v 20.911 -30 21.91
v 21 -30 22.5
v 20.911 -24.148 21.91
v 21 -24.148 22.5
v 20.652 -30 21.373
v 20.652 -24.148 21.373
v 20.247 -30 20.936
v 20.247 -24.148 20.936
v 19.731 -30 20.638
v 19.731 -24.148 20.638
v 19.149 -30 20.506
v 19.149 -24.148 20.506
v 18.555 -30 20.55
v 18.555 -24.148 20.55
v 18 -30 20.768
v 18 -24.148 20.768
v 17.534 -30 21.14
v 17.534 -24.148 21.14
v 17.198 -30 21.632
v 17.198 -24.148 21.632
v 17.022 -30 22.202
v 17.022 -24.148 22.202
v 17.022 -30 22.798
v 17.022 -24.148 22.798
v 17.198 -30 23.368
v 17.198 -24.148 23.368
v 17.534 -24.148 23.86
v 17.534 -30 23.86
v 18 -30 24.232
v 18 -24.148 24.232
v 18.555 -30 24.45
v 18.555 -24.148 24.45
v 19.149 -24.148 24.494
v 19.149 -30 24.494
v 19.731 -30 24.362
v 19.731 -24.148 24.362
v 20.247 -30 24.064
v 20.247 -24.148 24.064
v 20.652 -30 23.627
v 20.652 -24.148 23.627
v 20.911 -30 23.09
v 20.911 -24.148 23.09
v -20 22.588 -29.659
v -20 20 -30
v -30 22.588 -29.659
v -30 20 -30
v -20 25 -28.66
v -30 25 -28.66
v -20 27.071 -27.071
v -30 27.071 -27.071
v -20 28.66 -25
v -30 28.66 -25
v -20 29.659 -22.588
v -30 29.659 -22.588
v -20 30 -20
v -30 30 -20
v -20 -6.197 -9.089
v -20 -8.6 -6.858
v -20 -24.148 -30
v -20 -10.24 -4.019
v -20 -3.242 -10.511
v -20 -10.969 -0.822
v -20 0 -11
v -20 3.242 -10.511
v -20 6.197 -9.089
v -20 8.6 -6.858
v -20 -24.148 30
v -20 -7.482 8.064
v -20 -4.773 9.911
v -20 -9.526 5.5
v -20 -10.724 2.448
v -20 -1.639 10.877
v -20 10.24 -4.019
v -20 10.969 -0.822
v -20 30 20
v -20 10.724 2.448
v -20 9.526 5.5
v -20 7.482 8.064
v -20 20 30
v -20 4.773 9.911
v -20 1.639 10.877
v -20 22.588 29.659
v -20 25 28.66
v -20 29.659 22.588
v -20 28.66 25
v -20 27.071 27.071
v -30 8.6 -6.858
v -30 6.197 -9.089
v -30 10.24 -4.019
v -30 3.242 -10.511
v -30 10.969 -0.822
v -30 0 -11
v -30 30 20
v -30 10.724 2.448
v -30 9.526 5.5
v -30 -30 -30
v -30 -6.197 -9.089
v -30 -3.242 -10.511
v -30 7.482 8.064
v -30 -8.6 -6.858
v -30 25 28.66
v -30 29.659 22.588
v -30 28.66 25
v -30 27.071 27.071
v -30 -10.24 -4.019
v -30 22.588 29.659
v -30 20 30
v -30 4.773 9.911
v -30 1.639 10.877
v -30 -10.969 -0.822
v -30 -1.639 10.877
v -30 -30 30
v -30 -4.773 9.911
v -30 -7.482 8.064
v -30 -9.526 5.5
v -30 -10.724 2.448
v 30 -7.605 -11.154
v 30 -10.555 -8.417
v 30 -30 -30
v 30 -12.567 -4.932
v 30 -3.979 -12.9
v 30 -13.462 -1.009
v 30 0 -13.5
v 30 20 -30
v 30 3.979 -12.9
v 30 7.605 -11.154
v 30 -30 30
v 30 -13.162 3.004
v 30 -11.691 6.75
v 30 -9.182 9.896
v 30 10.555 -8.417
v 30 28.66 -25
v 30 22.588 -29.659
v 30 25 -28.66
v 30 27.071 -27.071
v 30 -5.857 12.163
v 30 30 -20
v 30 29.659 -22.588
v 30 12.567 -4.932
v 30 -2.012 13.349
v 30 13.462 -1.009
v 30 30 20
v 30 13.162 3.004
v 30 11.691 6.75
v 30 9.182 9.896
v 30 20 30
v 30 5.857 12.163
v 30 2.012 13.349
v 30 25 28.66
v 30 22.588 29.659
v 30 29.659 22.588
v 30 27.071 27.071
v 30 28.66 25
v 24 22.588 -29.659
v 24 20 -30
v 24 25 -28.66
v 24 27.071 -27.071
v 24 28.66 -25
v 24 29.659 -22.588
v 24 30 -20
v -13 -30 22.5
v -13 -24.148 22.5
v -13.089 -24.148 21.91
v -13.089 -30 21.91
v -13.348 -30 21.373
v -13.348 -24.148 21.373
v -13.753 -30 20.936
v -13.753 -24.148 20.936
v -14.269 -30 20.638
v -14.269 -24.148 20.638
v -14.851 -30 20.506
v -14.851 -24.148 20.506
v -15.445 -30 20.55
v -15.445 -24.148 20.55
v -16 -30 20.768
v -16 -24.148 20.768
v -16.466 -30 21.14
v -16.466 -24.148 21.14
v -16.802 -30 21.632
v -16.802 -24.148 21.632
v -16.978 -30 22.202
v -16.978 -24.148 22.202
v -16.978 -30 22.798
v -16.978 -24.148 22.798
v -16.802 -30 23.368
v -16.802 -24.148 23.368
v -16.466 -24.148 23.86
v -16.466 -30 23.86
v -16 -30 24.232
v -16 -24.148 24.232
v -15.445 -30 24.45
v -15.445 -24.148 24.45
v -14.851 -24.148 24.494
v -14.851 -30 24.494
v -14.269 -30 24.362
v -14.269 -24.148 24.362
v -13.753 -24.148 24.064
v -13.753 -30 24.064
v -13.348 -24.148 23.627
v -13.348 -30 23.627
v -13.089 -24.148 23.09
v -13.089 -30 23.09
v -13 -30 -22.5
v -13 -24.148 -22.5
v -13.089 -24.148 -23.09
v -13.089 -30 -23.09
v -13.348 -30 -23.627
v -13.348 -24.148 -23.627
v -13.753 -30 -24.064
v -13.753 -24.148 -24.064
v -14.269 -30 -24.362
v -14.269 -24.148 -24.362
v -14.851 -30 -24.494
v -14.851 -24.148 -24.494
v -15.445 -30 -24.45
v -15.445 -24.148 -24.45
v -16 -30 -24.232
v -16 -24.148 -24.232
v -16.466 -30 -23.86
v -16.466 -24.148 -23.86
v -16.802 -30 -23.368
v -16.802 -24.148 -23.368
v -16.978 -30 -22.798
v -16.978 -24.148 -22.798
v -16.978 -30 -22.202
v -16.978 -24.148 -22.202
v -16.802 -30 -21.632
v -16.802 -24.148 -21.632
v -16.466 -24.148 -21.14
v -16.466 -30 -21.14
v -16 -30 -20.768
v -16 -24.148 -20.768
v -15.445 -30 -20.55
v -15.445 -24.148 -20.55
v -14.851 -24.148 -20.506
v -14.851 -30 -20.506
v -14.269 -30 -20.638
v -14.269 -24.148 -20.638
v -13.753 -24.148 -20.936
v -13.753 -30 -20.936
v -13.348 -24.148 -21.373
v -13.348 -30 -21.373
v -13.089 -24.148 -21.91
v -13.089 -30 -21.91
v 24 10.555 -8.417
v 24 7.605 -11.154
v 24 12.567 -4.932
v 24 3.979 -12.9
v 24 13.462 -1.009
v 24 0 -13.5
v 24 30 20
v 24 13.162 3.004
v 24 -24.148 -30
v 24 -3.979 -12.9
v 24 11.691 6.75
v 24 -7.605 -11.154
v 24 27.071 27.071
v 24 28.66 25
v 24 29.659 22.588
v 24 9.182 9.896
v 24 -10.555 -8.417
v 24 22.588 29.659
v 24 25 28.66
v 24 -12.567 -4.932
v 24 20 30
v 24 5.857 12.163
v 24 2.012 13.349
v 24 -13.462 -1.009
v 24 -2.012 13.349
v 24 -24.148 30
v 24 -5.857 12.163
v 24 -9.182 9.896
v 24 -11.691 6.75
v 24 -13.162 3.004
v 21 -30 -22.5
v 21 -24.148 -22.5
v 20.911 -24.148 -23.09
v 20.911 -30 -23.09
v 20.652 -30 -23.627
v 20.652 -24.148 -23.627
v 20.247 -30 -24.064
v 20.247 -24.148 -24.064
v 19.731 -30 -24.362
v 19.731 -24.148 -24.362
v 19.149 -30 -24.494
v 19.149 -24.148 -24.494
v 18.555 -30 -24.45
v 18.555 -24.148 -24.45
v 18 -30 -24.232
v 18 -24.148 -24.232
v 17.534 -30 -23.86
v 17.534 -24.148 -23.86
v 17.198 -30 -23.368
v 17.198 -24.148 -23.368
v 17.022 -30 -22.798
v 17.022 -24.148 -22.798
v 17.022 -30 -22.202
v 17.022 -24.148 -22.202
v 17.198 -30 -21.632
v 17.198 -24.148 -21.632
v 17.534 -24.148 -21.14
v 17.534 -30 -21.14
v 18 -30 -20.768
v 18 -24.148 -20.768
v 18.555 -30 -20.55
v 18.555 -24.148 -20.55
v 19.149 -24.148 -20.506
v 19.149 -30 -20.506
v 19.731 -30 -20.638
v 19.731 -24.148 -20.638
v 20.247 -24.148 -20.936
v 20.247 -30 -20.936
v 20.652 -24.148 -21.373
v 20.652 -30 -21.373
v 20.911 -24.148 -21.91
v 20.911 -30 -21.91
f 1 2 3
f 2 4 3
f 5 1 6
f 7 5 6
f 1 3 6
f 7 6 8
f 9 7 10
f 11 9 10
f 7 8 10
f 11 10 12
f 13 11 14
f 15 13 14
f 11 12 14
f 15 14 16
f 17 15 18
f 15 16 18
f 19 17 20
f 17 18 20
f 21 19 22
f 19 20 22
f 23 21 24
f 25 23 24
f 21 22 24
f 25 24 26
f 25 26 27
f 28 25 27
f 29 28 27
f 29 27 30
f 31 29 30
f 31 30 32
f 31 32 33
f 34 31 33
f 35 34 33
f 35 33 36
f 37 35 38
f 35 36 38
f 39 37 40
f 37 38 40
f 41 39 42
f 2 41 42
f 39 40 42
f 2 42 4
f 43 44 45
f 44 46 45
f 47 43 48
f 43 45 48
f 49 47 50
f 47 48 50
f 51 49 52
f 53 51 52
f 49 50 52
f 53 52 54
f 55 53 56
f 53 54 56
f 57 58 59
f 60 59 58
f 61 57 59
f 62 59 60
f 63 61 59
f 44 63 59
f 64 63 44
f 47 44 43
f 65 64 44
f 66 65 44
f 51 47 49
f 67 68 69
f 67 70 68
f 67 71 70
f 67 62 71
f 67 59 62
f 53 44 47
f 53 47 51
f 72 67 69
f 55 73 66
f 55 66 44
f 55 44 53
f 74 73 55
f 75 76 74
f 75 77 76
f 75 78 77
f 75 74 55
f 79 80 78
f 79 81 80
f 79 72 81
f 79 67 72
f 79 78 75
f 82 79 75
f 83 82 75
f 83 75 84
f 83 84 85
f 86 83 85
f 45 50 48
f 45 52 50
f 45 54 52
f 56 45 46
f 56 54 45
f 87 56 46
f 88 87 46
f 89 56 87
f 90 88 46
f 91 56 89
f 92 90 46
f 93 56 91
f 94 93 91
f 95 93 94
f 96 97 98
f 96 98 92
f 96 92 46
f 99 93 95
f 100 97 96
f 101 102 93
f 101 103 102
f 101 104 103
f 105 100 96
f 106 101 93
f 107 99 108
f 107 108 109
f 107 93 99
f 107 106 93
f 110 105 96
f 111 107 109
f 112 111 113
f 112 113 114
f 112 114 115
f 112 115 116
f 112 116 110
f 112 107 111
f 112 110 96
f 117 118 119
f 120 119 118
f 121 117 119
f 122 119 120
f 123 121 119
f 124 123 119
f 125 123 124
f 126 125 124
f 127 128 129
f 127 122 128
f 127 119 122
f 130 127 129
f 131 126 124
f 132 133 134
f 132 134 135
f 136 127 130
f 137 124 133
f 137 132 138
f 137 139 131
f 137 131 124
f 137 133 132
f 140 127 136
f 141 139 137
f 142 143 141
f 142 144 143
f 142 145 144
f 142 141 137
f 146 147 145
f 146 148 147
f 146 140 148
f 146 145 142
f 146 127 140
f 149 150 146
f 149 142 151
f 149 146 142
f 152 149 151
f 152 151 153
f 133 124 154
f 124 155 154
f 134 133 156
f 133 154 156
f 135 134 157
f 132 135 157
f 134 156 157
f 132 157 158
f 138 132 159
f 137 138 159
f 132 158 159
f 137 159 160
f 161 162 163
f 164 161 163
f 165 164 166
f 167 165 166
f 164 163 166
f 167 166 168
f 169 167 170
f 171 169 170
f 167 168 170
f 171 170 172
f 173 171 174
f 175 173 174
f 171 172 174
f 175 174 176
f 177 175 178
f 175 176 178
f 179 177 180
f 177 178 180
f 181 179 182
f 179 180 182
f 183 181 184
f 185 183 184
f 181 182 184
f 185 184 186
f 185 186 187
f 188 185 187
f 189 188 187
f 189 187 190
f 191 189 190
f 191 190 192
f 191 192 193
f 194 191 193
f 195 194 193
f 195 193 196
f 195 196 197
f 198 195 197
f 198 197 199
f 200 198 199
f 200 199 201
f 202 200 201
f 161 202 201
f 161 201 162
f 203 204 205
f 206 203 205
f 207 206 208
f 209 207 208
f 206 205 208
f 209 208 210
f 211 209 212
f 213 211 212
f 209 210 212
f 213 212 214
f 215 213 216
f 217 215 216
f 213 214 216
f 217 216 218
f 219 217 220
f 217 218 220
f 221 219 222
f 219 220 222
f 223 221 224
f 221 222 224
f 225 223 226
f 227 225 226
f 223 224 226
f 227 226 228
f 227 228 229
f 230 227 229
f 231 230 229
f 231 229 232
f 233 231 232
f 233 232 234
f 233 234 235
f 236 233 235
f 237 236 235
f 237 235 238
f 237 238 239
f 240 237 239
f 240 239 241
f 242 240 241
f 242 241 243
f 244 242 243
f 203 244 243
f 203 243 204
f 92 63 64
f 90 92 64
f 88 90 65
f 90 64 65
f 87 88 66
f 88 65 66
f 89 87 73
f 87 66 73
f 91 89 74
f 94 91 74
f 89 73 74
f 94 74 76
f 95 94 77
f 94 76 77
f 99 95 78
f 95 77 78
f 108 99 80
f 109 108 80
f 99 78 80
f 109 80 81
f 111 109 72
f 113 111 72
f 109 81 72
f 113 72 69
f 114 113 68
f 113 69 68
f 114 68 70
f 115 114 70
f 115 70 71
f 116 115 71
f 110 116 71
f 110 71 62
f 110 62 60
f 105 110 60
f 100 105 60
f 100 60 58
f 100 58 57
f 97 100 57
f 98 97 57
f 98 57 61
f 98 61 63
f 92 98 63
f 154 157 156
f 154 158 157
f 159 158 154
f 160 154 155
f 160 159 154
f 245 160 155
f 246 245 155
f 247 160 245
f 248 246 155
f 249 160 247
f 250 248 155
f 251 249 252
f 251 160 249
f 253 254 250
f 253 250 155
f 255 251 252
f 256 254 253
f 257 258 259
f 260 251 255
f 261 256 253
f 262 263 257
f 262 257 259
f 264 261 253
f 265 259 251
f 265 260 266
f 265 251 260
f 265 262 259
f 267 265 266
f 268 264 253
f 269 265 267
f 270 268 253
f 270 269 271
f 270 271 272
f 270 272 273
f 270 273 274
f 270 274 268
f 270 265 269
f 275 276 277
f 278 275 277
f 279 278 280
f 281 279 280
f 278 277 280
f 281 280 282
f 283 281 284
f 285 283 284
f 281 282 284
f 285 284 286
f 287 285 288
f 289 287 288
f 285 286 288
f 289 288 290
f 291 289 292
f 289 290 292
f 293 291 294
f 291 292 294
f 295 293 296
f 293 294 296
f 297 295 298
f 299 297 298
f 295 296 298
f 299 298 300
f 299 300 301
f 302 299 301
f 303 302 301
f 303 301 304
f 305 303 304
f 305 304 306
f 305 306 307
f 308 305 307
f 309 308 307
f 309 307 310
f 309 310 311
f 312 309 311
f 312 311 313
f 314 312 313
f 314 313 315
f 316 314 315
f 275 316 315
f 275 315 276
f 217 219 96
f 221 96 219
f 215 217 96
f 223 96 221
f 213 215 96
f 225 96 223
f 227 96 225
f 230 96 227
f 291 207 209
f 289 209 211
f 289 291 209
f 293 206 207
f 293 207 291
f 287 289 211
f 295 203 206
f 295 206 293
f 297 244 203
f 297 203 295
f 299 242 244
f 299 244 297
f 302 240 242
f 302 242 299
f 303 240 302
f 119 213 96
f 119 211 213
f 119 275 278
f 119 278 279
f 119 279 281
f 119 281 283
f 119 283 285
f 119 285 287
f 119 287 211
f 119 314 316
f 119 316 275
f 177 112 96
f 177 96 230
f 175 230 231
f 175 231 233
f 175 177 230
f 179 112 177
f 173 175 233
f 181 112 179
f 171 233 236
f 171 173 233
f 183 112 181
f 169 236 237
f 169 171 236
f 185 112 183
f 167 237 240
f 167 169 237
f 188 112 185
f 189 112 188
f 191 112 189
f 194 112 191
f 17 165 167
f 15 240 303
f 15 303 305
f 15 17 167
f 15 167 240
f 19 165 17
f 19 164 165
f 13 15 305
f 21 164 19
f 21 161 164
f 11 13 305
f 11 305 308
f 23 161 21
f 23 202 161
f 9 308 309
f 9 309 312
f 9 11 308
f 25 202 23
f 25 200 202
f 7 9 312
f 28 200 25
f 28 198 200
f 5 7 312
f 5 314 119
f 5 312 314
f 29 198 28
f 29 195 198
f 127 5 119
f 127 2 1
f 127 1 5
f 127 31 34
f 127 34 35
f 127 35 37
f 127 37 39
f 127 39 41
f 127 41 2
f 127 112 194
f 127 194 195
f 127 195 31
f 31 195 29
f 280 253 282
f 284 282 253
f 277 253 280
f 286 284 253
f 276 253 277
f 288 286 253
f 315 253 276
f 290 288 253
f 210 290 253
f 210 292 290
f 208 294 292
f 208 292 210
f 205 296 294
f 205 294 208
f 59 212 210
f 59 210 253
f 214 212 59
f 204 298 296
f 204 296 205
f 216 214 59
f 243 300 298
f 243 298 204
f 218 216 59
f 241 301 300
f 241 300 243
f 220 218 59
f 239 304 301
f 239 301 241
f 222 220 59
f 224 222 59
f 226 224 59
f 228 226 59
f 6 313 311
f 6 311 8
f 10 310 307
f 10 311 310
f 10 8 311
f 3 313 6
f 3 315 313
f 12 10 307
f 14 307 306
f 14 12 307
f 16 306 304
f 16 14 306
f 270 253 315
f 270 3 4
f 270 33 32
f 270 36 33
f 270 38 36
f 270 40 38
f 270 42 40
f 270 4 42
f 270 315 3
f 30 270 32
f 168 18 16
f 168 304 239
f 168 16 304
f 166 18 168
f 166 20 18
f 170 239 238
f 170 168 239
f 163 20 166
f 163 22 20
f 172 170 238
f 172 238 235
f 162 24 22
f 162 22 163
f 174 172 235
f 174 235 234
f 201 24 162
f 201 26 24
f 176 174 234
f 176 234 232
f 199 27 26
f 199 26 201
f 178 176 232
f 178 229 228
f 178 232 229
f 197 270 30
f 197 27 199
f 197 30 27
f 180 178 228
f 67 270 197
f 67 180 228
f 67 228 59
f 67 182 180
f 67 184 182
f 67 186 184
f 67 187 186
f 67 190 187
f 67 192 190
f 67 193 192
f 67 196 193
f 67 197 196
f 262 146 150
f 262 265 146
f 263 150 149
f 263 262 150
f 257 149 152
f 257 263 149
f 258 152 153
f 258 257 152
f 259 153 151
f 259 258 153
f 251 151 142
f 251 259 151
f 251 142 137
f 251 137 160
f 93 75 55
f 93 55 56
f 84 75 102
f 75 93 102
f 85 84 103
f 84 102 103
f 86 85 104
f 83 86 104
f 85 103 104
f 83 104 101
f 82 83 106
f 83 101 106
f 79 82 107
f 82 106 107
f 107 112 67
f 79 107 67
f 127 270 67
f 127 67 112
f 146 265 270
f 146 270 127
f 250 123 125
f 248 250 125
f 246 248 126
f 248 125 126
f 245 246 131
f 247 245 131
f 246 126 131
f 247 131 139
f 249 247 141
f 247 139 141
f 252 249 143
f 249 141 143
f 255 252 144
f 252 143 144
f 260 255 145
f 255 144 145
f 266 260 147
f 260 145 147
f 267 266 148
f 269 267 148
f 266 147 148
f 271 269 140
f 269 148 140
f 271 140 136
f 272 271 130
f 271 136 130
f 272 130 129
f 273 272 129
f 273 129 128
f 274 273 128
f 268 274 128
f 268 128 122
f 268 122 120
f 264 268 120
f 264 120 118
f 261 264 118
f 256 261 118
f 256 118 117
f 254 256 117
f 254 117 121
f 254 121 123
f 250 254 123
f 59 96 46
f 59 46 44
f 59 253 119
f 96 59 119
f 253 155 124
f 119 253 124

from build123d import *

# Parameters (mm, degrees)
BOSS_EXTRUDE1_DEPTH = 30
SKETCH2_R           = 11
CUT_EXTRUDE1_DEPTH  = 60
FILLET1_R           = 10
SKETCH3_R           = 2
CUT_EXTRUDE2_DEPTH  = 10
SKETCH13_R          = 13.5
CUT_EXTRUDE3_DEPTH  = 10


with BuildPart() as part:
    # Sketch1 → Boss-Extrude1 (new body, symmetric)
    with BuildSketch(Plane.XY):
        Polygon((-30, 30), (-30, -30), (30, -30), (30, 30), (24, 30), (24, -24.147945483), (-20, -24.147945483), (-20, 30), align=None)
    extrude(amount=BOSS_EXTRUDE1_DEPTH, both=True)

    # Sketch2 → Cut-Extrude1 (cut)
    with BuildSketch(Plane(origin=(0, 0, 0), x_dir=(0, 0, -1), z_dir=(1, 0, 0))):
        Circle(SKETCH2_R)
    extrude(amount=-CUT_EXTRUDE1_DEPTH, mode=Mode.SUBTRACT)

    # Fillet1
    fillet1_edges = [part.edges().sort_by_distance(p)[0] for p in [
        (-25, 30, -30),
        (27, 30, 30),
        (-25, 30, 30),
        (27, 30, -30),
    ]]
    fillet(fillet1_edges, radius=FILLET1_R)

    # Sketch3 → Cut-Extrude2 (cut, symmetric)
    with BuildSketch(Plane(origin=(0, -24.147945483, 0), x_dir=(1, 0, 0), z_dir=(0, 1, 0))):
        with Locations((-15, 22.5)):
            Circle(SKETCH3_R)
        with Locations((19, 22.5)):
            Circle(SKETCH3_R)
        with Locations((-15, -22.5)):
            Circle(SKETCH3_R)
        with Locations((19, -22.5)):
            Circle(SKETCH3_R)
    extrude(amount=CUT_EXTRUDE2_DEPTH, both=True, mode=Mode.SUBTRACT)

    # Sketch13 → Cut-Extrude3 (cut)
    with BuildSketch(Plane(origin=(30, 0, 0), x_dir=(0, 0, -1), z_dir=(1, 0, 0))):
        Circle(SKETCH13_R)
    extrude(amount=-CUT_EXTRUDE3_DEPTH, mode=Mode.SUBTRACT)


solid = part.part
